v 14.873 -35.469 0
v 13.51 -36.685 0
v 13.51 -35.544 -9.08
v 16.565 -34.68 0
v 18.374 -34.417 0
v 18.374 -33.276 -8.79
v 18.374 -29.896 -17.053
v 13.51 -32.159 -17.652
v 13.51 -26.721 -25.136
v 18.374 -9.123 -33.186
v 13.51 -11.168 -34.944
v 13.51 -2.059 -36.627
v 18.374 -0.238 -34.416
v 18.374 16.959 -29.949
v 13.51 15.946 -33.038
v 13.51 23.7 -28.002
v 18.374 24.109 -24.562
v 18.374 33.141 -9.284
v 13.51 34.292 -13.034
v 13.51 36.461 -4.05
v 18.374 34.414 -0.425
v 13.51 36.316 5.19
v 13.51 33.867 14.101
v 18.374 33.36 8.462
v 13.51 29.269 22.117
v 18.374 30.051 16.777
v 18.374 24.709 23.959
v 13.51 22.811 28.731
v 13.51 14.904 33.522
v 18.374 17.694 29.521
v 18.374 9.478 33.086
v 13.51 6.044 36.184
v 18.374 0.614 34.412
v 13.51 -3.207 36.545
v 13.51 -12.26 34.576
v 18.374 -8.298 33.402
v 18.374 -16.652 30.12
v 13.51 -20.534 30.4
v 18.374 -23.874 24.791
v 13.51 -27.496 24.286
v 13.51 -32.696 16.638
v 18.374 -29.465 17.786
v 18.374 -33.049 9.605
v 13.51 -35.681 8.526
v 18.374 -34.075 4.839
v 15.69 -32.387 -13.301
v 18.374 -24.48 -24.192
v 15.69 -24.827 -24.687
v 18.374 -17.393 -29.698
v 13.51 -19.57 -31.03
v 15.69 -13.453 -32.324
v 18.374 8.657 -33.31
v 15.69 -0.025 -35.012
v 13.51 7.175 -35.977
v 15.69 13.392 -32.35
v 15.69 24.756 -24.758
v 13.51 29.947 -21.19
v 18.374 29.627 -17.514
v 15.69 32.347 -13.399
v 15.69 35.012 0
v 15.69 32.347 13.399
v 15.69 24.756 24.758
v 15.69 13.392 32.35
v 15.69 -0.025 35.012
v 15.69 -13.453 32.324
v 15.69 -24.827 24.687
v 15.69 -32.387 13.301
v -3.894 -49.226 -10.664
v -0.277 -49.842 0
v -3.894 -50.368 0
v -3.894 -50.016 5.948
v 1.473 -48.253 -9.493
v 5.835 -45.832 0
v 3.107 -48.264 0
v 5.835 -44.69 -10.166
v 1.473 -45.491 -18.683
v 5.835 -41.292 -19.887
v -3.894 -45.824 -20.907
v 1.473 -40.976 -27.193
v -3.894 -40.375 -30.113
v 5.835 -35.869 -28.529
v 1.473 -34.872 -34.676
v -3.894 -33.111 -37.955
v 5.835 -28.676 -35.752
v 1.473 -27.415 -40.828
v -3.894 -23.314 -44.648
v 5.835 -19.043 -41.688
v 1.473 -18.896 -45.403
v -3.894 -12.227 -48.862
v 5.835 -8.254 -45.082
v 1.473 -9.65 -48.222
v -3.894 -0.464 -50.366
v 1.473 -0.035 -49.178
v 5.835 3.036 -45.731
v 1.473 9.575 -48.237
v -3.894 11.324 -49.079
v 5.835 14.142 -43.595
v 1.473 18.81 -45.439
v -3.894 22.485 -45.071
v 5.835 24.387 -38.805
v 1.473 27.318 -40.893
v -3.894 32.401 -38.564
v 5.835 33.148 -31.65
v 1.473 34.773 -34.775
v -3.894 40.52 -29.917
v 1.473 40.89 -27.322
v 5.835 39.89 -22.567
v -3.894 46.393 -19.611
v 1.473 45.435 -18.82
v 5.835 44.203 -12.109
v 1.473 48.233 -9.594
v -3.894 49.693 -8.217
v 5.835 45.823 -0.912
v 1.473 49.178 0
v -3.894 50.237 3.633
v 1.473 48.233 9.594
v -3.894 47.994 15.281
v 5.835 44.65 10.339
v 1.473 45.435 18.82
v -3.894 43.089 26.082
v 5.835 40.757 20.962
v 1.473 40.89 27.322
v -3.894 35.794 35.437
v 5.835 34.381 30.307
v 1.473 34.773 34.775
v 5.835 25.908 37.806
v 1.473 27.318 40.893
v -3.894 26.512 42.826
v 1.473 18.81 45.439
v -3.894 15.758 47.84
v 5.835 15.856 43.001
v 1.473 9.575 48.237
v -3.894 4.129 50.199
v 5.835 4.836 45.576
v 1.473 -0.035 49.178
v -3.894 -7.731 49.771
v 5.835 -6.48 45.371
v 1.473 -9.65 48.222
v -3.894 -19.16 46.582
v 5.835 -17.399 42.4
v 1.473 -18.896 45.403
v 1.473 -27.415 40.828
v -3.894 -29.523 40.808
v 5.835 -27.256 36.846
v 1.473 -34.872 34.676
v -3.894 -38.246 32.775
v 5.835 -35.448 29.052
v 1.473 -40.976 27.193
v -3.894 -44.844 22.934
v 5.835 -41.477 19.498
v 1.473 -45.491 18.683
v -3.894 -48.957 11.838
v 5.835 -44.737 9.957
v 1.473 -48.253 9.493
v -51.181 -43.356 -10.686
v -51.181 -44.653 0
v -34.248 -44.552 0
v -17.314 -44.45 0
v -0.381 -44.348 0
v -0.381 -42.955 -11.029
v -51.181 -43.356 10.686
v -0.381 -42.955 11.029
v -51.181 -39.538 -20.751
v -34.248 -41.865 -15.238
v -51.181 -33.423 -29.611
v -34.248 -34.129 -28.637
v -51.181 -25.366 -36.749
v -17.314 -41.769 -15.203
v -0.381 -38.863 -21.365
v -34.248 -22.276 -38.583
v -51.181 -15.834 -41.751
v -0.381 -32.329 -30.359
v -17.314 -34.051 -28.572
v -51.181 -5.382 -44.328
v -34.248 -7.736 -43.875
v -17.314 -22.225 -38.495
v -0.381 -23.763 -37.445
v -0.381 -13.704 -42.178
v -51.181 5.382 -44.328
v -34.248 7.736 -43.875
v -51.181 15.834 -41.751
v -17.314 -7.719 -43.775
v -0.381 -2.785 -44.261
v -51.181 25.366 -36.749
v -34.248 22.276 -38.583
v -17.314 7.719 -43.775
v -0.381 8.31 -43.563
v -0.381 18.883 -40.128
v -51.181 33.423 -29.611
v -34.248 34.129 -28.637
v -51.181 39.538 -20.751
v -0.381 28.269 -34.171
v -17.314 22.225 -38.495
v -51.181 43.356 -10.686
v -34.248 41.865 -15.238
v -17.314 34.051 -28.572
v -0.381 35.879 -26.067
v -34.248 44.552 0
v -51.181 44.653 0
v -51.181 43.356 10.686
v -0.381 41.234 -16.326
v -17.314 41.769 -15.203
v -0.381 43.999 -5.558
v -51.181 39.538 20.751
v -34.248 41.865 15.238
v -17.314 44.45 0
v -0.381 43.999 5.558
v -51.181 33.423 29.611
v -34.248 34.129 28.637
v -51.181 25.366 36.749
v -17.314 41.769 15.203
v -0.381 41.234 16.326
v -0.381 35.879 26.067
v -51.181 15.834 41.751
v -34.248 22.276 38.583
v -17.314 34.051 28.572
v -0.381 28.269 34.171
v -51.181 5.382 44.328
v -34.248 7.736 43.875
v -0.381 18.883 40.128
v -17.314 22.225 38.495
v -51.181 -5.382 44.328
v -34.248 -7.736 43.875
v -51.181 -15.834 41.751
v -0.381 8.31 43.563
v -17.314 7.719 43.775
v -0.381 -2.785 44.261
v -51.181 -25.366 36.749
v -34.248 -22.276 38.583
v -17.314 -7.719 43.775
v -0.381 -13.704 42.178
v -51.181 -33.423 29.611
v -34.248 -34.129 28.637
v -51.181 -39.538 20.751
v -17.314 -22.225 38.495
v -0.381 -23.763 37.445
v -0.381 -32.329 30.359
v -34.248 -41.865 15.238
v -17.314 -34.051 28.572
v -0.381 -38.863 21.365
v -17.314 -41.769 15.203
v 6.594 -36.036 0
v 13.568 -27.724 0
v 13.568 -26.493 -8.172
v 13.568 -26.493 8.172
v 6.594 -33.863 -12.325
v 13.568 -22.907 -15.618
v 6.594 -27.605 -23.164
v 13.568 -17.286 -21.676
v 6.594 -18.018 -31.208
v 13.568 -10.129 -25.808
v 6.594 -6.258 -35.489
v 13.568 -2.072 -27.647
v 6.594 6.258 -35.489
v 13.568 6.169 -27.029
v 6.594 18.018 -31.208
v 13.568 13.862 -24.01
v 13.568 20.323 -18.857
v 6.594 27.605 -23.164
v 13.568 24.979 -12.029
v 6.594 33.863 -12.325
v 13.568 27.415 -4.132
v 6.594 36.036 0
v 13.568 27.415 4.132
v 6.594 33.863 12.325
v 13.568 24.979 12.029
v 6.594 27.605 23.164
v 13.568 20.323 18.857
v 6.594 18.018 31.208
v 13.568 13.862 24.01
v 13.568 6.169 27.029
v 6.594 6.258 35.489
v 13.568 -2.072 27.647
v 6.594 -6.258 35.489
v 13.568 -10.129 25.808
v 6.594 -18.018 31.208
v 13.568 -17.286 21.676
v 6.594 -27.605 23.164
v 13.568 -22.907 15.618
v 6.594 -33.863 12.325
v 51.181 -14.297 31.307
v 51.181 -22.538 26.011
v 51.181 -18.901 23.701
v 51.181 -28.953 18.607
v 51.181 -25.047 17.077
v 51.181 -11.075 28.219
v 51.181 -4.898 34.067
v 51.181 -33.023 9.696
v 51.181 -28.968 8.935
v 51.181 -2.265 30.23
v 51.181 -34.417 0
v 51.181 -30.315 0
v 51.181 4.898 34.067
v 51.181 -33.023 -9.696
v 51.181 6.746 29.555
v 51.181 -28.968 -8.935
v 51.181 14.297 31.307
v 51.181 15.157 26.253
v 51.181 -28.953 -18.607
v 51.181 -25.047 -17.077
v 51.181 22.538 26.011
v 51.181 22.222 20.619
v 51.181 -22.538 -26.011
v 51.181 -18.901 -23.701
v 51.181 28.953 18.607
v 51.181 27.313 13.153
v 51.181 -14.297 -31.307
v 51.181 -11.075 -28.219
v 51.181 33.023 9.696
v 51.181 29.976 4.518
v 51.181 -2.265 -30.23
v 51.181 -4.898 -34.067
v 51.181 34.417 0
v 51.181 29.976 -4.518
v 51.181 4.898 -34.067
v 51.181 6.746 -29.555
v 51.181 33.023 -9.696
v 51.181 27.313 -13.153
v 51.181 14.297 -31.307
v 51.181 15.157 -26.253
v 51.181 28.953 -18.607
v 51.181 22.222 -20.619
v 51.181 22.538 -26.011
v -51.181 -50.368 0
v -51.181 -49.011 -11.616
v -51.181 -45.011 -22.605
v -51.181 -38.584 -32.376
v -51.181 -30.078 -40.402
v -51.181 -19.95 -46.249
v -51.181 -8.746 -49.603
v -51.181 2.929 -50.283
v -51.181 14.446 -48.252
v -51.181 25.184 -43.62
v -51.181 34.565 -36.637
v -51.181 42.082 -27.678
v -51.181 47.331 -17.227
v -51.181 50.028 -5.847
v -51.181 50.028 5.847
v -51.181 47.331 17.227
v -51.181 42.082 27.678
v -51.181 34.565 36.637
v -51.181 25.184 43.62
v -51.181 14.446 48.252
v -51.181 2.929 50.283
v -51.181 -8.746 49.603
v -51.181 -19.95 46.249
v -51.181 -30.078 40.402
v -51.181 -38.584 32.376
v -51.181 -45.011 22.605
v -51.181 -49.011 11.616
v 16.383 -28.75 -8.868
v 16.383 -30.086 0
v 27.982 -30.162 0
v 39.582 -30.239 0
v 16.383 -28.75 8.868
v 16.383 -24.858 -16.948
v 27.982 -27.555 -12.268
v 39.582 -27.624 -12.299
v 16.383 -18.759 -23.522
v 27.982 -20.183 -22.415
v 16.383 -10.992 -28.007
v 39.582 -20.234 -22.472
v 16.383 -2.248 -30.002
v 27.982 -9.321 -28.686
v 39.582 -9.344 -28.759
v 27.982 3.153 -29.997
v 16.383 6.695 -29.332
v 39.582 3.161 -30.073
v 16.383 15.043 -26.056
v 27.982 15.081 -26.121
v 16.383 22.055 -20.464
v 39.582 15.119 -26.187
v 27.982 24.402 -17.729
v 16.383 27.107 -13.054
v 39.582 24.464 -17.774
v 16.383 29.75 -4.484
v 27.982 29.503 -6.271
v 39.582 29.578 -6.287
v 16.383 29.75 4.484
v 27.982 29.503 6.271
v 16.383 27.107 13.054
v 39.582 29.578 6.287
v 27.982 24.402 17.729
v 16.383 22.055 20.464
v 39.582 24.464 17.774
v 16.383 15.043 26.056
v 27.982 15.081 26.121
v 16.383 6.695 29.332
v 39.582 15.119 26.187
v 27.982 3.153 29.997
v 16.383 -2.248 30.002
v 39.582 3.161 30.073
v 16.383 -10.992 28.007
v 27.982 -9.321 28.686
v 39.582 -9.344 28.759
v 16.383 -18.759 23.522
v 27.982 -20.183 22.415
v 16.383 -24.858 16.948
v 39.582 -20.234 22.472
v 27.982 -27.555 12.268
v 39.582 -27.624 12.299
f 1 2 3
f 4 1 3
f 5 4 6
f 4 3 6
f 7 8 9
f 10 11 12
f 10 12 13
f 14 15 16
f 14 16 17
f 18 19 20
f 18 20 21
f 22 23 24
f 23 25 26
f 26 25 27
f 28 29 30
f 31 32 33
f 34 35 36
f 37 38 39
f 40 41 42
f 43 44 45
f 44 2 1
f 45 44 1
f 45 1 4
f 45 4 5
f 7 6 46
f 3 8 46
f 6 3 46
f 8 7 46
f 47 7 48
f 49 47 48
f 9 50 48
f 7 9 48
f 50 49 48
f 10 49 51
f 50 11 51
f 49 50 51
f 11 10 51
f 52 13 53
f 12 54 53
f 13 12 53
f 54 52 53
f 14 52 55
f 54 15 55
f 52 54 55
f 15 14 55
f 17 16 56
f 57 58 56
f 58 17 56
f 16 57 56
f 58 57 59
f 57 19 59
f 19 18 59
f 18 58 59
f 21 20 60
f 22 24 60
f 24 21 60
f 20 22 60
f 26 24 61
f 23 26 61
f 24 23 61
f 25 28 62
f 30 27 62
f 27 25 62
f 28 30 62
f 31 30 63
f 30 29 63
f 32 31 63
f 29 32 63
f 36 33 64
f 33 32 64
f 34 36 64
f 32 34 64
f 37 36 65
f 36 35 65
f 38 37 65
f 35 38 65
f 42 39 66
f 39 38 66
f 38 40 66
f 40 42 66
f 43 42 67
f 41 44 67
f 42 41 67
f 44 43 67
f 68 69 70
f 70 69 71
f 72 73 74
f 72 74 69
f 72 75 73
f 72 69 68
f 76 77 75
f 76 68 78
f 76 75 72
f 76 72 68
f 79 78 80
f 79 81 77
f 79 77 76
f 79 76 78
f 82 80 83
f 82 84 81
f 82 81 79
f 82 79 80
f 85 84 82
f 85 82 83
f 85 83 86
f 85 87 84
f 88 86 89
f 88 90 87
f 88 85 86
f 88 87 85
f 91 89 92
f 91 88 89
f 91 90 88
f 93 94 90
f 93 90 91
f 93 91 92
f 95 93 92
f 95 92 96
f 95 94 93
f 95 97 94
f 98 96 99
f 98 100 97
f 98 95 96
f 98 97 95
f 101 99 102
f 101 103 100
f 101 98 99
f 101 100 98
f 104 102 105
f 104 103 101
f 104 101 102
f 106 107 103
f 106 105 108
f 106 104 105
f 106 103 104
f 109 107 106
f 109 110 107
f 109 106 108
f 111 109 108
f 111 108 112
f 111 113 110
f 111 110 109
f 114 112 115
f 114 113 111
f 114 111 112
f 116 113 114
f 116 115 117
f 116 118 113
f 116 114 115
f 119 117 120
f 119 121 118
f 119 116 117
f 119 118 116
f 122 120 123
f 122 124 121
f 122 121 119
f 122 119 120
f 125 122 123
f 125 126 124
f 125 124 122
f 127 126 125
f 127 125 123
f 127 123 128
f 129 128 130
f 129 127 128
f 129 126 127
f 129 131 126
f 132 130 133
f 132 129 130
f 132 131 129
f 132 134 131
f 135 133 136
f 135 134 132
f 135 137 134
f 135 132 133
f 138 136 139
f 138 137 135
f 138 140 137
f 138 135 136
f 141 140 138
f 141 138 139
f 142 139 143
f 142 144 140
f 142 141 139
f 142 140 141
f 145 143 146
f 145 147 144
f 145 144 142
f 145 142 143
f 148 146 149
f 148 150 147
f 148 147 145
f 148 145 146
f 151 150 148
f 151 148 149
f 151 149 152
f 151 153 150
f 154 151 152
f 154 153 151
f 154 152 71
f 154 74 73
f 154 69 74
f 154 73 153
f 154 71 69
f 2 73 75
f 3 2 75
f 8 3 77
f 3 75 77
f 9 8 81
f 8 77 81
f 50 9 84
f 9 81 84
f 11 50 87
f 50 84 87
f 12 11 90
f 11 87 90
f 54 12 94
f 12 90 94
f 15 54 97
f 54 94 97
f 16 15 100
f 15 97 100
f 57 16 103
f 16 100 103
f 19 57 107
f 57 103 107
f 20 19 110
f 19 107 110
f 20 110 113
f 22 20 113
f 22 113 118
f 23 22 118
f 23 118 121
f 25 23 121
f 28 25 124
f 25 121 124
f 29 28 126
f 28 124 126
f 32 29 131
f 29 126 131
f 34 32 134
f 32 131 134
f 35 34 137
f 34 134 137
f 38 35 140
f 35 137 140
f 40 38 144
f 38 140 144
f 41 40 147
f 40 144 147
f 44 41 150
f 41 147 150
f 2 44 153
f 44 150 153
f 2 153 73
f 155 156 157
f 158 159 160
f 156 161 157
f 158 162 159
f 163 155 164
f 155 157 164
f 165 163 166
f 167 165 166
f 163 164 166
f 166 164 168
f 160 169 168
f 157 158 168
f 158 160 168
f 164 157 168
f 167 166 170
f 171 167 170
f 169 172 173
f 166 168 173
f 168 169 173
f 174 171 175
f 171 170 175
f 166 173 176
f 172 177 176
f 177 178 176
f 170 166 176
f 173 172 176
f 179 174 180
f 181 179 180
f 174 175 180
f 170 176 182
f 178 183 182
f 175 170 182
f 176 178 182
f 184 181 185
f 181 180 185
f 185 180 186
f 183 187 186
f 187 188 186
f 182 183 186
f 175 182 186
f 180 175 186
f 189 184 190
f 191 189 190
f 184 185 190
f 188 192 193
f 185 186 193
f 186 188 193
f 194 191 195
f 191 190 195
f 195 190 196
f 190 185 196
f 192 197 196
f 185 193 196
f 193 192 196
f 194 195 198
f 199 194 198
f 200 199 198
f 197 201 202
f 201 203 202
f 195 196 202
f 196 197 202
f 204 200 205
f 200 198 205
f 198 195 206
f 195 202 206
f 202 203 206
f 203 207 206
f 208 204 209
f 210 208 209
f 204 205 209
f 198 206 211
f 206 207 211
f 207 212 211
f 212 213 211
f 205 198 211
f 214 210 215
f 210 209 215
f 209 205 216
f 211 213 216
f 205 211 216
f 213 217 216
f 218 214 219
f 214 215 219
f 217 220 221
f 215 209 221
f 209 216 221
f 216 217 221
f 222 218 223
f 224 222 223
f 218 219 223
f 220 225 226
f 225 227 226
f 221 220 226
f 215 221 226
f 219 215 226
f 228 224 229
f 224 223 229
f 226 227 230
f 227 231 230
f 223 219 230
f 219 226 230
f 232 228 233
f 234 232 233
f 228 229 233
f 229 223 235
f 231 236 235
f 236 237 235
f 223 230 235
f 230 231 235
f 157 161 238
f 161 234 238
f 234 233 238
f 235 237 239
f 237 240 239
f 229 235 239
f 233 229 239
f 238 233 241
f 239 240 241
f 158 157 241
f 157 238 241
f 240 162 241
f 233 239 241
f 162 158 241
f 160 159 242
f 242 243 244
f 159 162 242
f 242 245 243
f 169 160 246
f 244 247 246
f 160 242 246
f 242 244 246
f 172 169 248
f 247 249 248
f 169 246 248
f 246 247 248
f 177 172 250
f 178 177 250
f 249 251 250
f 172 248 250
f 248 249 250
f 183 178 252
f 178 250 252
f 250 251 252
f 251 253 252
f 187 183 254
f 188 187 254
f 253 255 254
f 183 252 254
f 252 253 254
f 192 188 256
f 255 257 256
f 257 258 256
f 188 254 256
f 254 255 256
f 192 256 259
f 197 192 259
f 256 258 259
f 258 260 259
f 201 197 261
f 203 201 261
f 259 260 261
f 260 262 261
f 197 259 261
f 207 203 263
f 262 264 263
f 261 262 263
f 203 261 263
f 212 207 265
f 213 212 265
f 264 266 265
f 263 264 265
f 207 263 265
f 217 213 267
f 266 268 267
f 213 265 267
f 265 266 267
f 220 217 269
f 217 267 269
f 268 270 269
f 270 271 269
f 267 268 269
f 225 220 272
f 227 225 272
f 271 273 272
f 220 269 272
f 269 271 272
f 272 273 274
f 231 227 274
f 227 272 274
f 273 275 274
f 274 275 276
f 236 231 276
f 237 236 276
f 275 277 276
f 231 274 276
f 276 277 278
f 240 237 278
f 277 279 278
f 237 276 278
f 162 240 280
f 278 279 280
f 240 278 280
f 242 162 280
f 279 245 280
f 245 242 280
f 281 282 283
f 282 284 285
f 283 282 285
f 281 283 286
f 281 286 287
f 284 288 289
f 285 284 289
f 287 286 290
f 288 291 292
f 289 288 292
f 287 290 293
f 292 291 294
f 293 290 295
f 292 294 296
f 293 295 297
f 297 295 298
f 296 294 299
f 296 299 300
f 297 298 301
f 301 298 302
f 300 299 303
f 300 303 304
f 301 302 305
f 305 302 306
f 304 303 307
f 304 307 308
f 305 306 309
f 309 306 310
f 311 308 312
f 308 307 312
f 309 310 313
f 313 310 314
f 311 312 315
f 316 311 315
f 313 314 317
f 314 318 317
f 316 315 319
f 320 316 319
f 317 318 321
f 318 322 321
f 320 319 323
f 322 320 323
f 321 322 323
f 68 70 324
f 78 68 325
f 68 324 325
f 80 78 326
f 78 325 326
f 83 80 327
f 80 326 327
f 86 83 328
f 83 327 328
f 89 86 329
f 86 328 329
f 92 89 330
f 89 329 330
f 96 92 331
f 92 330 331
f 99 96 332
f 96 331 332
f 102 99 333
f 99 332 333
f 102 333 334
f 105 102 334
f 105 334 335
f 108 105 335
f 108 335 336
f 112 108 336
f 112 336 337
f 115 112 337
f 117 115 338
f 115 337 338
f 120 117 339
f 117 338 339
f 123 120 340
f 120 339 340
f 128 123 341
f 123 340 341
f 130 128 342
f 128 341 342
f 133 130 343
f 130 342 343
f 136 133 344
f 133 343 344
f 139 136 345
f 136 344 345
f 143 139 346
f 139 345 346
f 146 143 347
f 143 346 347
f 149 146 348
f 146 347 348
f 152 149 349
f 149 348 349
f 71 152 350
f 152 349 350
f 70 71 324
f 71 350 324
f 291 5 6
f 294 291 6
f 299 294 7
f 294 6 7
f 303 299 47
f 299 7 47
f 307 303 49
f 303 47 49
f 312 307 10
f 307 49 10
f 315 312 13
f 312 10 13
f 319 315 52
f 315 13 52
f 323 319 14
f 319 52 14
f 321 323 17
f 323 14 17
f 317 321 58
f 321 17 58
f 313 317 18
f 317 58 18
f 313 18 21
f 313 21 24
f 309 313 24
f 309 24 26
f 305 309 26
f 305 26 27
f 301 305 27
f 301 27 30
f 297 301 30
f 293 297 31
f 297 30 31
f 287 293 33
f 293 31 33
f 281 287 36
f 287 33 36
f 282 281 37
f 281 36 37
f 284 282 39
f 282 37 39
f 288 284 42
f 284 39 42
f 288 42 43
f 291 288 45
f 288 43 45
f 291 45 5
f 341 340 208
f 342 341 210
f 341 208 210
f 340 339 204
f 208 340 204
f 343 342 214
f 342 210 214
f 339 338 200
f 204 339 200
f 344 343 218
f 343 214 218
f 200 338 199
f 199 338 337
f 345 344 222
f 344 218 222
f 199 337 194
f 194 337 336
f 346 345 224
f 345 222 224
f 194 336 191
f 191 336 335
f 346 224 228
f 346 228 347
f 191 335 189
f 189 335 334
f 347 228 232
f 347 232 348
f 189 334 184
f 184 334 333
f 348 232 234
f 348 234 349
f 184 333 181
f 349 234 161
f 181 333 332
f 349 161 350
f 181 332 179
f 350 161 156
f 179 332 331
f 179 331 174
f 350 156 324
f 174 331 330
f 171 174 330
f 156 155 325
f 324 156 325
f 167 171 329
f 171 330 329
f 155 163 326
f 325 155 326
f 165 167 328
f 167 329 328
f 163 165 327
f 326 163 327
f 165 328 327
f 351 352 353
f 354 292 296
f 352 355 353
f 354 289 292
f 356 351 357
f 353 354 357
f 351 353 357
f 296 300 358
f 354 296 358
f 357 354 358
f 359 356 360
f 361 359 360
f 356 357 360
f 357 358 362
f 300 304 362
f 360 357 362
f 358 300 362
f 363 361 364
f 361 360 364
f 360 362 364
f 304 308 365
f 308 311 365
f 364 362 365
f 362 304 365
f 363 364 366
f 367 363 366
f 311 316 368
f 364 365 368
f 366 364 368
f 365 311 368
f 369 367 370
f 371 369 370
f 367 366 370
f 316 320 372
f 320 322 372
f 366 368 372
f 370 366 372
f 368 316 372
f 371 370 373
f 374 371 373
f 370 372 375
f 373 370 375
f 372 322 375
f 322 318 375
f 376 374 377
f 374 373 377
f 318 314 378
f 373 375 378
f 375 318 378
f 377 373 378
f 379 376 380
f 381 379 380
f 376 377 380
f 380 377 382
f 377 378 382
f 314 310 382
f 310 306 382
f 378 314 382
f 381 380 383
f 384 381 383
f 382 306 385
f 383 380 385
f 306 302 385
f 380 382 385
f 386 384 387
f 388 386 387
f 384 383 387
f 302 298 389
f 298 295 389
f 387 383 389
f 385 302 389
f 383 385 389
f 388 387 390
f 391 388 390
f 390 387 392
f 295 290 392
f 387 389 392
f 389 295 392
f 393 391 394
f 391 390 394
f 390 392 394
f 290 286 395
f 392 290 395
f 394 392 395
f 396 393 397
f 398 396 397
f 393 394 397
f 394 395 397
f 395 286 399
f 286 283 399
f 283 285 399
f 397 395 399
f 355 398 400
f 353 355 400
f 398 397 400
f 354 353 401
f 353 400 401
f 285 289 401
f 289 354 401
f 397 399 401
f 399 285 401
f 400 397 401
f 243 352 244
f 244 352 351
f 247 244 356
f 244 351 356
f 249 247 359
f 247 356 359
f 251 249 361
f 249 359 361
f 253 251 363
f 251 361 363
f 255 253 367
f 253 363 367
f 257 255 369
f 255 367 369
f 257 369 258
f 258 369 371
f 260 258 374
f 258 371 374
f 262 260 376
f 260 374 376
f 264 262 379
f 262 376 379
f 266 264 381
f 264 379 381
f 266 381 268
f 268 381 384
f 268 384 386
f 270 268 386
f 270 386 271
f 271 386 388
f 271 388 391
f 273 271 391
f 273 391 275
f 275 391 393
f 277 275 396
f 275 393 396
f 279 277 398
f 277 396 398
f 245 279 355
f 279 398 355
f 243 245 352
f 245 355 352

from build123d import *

# Parameters (mm, degrees)
FILLET1_R = 12.7
FILLET2_R = 6.35


with BuildPart() as part:
    # Sketch1 → Revolve1 (revolve)
    with BuildSketch(Plane.XY):
        Polygon((-0.381, -44.3484), (13.568194302, -27.724397577), (16.383, -30.0863), (51.181, -30.3149), (51.181, -34.417), (15.412836736, -34.417), (2.028190699, -50.3682), (-51.181, -50.3682), (-51.181, -44.6532), align=None)
    revolve(axis=Axis((-51.181, 0, 0), (1, 0, 0)))

    # Fillet1
    fillet1_edges = [part.edges().sort_by_distance(p)[0] for p in [
        (2.028190699, 50.3682, 0),
    ]]
    fillet(fillet1_edges, radius=FILLET1_R)

    # Fillet2
    fillet2_edges = [part.edges().sort_by_distance(p)[0] for p in [
        (15.412836736, 34.417, 0),
    ]]
    fillet(fillet2_edges, radius=FILLET2_R)


solid = part.part
